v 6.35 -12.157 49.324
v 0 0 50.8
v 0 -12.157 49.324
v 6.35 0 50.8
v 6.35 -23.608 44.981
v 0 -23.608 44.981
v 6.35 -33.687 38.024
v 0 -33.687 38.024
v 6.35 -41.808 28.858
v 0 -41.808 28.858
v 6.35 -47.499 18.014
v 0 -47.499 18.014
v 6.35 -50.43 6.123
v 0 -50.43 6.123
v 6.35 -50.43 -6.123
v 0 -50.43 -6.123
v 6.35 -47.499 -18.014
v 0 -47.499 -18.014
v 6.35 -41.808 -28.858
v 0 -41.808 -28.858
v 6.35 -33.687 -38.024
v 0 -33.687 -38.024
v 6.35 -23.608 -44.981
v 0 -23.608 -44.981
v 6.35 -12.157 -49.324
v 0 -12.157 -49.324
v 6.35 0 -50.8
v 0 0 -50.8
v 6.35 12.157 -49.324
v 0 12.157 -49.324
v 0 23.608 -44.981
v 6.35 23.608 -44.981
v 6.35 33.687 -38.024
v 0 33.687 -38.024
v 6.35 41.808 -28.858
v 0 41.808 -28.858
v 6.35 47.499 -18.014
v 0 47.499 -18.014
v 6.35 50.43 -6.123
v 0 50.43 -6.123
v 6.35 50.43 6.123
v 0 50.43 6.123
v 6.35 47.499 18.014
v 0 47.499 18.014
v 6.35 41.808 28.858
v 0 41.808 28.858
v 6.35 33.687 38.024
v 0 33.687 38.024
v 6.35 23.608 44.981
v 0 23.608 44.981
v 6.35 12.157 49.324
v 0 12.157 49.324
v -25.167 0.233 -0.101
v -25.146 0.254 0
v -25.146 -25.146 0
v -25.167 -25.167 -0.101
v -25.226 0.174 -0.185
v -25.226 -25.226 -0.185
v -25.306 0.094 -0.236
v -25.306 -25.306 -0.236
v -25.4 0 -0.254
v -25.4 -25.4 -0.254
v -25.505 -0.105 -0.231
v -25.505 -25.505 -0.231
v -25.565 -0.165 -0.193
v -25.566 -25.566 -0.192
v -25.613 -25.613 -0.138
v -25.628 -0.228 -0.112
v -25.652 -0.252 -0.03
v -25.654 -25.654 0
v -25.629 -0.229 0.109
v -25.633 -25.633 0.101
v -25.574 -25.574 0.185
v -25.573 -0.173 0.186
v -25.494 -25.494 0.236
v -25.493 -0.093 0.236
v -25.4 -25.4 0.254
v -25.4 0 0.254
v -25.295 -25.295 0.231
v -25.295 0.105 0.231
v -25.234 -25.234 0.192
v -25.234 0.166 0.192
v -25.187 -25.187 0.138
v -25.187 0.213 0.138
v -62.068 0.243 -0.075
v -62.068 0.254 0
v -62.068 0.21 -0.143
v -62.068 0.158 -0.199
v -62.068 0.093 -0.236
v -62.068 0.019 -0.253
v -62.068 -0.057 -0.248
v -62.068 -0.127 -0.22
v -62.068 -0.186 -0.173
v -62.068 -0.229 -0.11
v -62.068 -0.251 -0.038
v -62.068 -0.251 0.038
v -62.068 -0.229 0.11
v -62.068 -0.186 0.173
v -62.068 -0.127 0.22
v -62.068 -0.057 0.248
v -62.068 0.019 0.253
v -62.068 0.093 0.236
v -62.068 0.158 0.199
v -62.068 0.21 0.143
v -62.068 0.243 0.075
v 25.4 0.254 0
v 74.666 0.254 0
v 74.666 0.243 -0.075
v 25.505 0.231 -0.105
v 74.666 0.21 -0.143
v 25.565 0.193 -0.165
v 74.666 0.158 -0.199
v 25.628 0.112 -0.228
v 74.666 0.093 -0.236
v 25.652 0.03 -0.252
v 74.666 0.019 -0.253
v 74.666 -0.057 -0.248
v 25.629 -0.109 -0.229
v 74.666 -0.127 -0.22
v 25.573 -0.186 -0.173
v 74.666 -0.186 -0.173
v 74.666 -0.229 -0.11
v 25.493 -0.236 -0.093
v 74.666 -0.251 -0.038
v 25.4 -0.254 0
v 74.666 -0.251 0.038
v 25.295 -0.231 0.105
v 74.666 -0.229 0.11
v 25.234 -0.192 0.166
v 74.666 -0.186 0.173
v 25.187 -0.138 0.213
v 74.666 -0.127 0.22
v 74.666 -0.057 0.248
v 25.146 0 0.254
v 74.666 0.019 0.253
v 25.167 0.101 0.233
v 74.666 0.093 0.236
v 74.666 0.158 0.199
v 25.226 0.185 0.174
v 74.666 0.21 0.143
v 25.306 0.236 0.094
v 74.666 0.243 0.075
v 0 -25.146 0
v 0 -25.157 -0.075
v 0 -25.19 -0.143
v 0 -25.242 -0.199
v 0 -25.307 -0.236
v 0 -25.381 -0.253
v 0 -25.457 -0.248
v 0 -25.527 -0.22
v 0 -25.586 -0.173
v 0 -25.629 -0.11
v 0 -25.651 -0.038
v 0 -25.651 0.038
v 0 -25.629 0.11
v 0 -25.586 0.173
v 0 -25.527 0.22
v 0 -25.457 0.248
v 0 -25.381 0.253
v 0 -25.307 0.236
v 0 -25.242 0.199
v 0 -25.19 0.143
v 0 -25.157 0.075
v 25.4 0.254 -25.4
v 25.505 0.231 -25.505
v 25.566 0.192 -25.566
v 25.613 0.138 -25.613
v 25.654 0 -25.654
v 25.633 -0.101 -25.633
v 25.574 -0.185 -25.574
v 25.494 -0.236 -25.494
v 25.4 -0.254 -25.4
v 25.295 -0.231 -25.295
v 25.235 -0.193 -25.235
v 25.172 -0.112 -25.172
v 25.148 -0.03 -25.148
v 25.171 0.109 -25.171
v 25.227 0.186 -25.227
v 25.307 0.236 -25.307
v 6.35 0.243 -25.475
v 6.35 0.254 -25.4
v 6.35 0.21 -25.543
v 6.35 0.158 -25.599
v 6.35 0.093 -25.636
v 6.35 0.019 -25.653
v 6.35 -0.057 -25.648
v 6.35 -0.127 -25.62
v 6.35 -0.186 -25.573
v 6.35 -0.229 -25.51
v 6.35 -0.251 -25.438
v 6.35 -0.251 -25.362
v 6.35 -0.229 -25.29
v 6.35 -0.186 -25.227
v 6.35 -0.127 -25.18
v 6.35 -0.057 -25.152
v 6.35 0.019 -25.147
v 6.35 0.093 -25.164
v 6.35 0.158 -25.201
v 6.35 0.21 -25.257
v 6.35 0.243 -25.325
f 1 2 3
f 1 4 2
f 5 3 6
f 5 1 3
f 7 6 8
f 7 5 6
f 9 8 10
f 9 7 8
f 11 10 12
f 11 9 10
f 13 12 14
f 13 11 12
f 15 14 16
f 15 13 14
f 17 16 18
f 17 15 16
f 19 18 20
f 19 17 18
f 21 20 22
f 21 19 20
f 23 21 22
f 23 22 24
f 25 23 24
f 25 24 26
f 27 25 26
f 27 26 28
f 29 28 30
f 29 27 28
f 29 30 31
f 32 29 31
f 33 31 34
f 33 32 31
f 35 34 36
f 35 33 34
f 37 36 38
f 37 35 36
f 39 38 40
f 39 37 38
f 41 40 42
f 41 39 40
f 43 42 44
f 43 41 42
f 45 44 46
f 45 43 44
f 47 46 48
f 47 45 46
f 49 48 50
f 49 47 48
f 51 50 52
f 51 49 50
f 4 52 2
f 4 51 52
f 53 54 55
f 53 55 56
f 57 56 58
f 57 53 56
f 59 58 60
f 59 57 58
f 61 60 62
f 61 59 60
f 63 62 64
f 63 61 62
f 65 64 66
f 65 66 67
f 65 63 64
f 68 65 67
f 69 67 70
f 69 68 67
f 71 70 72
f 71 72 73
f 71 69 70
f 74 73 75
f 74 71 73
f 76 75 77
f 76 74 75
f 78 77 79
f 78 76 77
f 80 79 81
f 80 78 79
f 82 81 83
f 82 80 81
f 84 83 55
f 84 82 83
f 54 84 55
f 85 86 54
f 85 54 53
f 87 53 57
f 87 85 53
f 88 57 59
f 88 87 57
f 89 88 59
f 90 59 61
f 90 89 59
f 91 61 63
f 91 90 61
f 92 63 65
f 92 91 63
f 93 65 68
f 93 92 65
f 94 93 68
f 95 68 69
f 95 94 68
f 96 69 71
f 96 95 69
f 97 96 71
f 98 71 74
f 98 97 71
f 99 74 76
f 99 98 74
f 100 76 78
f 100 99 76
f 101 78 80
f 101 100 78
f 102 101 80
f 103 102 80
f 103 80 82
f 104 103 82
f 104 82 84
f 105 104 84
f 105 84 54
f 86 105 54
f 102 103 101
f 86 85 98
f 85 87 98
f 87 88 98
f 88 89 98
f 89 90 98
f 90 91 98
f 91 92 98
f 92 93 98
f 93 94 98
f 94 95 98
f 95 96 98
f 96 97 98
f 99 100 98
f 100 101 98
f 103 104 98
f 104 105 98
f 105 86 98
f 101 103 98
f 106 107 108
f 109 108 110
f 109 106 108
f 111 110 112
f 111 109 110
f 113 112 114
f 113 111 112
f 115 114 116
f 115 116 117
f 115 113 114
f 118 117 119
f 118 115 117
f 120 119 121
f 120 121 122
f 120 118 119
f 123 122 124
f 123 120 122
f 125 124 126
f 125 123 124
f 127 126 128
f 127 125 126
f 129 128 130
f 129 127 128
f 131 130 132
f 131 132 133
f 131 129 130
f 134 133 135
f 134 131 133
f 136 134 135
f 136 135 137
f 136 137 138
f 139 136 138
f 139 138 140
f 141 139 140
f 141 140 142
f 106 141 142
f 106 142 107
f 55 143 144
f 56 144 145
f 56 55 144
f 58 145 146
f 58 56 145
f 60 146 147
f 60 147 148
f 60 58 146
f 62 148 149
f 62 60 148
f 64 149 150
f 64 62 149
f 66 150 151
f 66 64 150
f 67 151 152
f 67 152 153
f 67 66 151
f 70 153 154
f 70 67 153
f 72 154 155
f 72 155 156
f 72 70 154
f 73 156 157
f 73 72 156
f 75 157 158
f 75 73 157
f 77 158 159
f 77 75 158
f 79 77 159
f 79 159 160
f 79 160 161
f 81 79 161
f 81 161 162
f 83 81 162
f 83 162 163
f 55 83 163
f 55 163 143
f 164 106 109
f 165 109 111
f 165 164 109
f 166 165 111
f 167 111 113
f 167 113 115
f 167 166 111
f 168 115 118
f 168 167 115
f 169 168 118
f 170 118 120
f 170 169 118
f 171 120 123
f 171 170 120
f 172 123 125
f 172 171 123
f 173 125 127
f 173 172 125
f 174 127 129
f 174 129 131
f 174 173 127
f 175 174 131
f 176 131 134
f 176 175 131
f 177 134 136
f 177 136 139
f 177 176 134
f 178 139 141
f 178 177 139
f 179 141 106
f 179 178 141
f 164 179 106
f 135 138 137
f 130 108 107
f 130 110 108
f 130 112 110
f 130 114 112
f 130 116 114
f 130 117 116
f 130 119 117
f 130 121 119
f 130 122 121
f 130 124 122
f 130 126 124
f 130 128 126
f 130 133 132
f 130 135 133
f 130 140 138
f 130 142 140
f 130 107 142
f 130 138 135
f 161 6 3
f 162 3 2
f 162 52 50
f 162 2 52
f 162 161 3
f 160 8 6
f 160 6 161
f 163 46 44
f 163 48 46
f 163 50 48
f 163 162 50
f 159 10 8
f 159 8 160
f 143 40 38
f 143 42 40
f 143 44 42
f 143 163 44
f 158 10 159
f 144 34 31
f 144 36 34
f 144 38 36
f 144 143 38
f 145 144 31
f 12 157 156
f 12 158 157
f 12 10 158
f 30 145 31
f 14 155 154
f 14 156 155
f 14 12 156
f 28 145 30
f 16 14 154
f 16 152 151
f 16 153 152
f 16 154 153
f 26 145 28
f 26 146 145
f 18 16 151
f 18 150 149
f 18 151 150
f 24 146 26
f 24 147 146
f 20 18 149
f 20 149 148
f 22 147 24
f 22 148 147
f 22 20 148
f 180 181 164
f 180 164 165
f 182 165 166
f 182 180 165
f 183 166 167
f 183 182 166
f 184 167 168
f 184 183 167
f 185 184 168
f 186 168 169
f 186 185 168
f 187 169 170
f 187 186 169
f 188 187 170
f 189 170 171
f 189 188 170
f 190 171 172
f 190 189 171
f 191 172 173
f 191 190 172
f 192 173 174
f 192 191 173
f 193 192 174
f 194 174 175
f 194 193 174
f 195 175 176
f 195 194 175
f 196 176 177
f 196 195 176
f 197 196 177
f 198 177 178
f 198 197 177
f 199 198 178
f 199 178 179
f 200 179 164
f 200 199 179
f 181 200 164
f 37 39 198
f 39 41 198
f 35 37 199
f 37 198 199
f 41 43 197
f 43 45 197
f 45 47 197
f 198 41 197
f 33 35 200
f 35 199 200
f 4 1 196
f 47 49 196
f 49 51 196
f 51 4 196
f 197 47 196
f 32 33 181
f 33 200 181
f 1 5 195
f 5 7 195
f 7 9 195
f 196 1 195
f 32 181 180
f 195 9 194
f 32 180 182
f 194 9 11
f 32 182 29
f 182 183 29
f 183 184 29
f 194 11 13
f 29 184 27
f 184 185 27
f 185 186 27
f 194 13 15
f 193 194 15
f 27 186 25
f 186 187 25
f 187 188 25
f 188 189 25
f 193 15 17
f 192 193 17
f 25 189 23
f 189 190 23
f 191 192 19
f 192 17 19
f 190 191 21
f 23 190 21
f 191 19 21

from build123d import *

# Parameters (mm, degrees)
F0_W = 6.35
F0_H = 50.8
F4_R = 0.254
F8_R = 0.254


with BuildPart() as f1:
    # F0 (on Front) → F1 (revolve)
    with BuildSketch(Plane.XZ):
        with Locations((3.175, 25.4)):
            Rectangle(F0_W, F0_H)
    revolve(axis=Axis((3.175, 0, 0), (1, 0, 0)))

    # F5: sweep along a path in F2
    with BuildLine(Plane.XY) as f5_path:
        Line((0, -25.4), (-25.4, -25.4))
        Line((-25.4, -25.4), (-25.4, 0))
        Line((-25.4, 0), (-62.0676704339, 0))
    # F4 (on offset) → F5 (sweep)
    with BuildSketch(Plane.YZ.offset(-33.02)):
        Circle(F4_R)
    sweep(path=f5_path.line, transition=Transition.RIGHT)

    # F9: sweep along a path in F6
    with BuildLine(Plane.XZ) as f9_path:
        Line((74.6657835295, 0), (25.4, 0))
        Line((25.4, 0), (25.4, -25.4))
        Line((25.4, -25.4), (0, -25.4))
    # F8 (on offset) → F9 (sweep)
    with BuildSketch(Plane.YZ.offset(33.02)):
        Circle(F8_R)
    sweep(path=f9_path.line, transition=Transition.RIGHT)


solid = f1.part
